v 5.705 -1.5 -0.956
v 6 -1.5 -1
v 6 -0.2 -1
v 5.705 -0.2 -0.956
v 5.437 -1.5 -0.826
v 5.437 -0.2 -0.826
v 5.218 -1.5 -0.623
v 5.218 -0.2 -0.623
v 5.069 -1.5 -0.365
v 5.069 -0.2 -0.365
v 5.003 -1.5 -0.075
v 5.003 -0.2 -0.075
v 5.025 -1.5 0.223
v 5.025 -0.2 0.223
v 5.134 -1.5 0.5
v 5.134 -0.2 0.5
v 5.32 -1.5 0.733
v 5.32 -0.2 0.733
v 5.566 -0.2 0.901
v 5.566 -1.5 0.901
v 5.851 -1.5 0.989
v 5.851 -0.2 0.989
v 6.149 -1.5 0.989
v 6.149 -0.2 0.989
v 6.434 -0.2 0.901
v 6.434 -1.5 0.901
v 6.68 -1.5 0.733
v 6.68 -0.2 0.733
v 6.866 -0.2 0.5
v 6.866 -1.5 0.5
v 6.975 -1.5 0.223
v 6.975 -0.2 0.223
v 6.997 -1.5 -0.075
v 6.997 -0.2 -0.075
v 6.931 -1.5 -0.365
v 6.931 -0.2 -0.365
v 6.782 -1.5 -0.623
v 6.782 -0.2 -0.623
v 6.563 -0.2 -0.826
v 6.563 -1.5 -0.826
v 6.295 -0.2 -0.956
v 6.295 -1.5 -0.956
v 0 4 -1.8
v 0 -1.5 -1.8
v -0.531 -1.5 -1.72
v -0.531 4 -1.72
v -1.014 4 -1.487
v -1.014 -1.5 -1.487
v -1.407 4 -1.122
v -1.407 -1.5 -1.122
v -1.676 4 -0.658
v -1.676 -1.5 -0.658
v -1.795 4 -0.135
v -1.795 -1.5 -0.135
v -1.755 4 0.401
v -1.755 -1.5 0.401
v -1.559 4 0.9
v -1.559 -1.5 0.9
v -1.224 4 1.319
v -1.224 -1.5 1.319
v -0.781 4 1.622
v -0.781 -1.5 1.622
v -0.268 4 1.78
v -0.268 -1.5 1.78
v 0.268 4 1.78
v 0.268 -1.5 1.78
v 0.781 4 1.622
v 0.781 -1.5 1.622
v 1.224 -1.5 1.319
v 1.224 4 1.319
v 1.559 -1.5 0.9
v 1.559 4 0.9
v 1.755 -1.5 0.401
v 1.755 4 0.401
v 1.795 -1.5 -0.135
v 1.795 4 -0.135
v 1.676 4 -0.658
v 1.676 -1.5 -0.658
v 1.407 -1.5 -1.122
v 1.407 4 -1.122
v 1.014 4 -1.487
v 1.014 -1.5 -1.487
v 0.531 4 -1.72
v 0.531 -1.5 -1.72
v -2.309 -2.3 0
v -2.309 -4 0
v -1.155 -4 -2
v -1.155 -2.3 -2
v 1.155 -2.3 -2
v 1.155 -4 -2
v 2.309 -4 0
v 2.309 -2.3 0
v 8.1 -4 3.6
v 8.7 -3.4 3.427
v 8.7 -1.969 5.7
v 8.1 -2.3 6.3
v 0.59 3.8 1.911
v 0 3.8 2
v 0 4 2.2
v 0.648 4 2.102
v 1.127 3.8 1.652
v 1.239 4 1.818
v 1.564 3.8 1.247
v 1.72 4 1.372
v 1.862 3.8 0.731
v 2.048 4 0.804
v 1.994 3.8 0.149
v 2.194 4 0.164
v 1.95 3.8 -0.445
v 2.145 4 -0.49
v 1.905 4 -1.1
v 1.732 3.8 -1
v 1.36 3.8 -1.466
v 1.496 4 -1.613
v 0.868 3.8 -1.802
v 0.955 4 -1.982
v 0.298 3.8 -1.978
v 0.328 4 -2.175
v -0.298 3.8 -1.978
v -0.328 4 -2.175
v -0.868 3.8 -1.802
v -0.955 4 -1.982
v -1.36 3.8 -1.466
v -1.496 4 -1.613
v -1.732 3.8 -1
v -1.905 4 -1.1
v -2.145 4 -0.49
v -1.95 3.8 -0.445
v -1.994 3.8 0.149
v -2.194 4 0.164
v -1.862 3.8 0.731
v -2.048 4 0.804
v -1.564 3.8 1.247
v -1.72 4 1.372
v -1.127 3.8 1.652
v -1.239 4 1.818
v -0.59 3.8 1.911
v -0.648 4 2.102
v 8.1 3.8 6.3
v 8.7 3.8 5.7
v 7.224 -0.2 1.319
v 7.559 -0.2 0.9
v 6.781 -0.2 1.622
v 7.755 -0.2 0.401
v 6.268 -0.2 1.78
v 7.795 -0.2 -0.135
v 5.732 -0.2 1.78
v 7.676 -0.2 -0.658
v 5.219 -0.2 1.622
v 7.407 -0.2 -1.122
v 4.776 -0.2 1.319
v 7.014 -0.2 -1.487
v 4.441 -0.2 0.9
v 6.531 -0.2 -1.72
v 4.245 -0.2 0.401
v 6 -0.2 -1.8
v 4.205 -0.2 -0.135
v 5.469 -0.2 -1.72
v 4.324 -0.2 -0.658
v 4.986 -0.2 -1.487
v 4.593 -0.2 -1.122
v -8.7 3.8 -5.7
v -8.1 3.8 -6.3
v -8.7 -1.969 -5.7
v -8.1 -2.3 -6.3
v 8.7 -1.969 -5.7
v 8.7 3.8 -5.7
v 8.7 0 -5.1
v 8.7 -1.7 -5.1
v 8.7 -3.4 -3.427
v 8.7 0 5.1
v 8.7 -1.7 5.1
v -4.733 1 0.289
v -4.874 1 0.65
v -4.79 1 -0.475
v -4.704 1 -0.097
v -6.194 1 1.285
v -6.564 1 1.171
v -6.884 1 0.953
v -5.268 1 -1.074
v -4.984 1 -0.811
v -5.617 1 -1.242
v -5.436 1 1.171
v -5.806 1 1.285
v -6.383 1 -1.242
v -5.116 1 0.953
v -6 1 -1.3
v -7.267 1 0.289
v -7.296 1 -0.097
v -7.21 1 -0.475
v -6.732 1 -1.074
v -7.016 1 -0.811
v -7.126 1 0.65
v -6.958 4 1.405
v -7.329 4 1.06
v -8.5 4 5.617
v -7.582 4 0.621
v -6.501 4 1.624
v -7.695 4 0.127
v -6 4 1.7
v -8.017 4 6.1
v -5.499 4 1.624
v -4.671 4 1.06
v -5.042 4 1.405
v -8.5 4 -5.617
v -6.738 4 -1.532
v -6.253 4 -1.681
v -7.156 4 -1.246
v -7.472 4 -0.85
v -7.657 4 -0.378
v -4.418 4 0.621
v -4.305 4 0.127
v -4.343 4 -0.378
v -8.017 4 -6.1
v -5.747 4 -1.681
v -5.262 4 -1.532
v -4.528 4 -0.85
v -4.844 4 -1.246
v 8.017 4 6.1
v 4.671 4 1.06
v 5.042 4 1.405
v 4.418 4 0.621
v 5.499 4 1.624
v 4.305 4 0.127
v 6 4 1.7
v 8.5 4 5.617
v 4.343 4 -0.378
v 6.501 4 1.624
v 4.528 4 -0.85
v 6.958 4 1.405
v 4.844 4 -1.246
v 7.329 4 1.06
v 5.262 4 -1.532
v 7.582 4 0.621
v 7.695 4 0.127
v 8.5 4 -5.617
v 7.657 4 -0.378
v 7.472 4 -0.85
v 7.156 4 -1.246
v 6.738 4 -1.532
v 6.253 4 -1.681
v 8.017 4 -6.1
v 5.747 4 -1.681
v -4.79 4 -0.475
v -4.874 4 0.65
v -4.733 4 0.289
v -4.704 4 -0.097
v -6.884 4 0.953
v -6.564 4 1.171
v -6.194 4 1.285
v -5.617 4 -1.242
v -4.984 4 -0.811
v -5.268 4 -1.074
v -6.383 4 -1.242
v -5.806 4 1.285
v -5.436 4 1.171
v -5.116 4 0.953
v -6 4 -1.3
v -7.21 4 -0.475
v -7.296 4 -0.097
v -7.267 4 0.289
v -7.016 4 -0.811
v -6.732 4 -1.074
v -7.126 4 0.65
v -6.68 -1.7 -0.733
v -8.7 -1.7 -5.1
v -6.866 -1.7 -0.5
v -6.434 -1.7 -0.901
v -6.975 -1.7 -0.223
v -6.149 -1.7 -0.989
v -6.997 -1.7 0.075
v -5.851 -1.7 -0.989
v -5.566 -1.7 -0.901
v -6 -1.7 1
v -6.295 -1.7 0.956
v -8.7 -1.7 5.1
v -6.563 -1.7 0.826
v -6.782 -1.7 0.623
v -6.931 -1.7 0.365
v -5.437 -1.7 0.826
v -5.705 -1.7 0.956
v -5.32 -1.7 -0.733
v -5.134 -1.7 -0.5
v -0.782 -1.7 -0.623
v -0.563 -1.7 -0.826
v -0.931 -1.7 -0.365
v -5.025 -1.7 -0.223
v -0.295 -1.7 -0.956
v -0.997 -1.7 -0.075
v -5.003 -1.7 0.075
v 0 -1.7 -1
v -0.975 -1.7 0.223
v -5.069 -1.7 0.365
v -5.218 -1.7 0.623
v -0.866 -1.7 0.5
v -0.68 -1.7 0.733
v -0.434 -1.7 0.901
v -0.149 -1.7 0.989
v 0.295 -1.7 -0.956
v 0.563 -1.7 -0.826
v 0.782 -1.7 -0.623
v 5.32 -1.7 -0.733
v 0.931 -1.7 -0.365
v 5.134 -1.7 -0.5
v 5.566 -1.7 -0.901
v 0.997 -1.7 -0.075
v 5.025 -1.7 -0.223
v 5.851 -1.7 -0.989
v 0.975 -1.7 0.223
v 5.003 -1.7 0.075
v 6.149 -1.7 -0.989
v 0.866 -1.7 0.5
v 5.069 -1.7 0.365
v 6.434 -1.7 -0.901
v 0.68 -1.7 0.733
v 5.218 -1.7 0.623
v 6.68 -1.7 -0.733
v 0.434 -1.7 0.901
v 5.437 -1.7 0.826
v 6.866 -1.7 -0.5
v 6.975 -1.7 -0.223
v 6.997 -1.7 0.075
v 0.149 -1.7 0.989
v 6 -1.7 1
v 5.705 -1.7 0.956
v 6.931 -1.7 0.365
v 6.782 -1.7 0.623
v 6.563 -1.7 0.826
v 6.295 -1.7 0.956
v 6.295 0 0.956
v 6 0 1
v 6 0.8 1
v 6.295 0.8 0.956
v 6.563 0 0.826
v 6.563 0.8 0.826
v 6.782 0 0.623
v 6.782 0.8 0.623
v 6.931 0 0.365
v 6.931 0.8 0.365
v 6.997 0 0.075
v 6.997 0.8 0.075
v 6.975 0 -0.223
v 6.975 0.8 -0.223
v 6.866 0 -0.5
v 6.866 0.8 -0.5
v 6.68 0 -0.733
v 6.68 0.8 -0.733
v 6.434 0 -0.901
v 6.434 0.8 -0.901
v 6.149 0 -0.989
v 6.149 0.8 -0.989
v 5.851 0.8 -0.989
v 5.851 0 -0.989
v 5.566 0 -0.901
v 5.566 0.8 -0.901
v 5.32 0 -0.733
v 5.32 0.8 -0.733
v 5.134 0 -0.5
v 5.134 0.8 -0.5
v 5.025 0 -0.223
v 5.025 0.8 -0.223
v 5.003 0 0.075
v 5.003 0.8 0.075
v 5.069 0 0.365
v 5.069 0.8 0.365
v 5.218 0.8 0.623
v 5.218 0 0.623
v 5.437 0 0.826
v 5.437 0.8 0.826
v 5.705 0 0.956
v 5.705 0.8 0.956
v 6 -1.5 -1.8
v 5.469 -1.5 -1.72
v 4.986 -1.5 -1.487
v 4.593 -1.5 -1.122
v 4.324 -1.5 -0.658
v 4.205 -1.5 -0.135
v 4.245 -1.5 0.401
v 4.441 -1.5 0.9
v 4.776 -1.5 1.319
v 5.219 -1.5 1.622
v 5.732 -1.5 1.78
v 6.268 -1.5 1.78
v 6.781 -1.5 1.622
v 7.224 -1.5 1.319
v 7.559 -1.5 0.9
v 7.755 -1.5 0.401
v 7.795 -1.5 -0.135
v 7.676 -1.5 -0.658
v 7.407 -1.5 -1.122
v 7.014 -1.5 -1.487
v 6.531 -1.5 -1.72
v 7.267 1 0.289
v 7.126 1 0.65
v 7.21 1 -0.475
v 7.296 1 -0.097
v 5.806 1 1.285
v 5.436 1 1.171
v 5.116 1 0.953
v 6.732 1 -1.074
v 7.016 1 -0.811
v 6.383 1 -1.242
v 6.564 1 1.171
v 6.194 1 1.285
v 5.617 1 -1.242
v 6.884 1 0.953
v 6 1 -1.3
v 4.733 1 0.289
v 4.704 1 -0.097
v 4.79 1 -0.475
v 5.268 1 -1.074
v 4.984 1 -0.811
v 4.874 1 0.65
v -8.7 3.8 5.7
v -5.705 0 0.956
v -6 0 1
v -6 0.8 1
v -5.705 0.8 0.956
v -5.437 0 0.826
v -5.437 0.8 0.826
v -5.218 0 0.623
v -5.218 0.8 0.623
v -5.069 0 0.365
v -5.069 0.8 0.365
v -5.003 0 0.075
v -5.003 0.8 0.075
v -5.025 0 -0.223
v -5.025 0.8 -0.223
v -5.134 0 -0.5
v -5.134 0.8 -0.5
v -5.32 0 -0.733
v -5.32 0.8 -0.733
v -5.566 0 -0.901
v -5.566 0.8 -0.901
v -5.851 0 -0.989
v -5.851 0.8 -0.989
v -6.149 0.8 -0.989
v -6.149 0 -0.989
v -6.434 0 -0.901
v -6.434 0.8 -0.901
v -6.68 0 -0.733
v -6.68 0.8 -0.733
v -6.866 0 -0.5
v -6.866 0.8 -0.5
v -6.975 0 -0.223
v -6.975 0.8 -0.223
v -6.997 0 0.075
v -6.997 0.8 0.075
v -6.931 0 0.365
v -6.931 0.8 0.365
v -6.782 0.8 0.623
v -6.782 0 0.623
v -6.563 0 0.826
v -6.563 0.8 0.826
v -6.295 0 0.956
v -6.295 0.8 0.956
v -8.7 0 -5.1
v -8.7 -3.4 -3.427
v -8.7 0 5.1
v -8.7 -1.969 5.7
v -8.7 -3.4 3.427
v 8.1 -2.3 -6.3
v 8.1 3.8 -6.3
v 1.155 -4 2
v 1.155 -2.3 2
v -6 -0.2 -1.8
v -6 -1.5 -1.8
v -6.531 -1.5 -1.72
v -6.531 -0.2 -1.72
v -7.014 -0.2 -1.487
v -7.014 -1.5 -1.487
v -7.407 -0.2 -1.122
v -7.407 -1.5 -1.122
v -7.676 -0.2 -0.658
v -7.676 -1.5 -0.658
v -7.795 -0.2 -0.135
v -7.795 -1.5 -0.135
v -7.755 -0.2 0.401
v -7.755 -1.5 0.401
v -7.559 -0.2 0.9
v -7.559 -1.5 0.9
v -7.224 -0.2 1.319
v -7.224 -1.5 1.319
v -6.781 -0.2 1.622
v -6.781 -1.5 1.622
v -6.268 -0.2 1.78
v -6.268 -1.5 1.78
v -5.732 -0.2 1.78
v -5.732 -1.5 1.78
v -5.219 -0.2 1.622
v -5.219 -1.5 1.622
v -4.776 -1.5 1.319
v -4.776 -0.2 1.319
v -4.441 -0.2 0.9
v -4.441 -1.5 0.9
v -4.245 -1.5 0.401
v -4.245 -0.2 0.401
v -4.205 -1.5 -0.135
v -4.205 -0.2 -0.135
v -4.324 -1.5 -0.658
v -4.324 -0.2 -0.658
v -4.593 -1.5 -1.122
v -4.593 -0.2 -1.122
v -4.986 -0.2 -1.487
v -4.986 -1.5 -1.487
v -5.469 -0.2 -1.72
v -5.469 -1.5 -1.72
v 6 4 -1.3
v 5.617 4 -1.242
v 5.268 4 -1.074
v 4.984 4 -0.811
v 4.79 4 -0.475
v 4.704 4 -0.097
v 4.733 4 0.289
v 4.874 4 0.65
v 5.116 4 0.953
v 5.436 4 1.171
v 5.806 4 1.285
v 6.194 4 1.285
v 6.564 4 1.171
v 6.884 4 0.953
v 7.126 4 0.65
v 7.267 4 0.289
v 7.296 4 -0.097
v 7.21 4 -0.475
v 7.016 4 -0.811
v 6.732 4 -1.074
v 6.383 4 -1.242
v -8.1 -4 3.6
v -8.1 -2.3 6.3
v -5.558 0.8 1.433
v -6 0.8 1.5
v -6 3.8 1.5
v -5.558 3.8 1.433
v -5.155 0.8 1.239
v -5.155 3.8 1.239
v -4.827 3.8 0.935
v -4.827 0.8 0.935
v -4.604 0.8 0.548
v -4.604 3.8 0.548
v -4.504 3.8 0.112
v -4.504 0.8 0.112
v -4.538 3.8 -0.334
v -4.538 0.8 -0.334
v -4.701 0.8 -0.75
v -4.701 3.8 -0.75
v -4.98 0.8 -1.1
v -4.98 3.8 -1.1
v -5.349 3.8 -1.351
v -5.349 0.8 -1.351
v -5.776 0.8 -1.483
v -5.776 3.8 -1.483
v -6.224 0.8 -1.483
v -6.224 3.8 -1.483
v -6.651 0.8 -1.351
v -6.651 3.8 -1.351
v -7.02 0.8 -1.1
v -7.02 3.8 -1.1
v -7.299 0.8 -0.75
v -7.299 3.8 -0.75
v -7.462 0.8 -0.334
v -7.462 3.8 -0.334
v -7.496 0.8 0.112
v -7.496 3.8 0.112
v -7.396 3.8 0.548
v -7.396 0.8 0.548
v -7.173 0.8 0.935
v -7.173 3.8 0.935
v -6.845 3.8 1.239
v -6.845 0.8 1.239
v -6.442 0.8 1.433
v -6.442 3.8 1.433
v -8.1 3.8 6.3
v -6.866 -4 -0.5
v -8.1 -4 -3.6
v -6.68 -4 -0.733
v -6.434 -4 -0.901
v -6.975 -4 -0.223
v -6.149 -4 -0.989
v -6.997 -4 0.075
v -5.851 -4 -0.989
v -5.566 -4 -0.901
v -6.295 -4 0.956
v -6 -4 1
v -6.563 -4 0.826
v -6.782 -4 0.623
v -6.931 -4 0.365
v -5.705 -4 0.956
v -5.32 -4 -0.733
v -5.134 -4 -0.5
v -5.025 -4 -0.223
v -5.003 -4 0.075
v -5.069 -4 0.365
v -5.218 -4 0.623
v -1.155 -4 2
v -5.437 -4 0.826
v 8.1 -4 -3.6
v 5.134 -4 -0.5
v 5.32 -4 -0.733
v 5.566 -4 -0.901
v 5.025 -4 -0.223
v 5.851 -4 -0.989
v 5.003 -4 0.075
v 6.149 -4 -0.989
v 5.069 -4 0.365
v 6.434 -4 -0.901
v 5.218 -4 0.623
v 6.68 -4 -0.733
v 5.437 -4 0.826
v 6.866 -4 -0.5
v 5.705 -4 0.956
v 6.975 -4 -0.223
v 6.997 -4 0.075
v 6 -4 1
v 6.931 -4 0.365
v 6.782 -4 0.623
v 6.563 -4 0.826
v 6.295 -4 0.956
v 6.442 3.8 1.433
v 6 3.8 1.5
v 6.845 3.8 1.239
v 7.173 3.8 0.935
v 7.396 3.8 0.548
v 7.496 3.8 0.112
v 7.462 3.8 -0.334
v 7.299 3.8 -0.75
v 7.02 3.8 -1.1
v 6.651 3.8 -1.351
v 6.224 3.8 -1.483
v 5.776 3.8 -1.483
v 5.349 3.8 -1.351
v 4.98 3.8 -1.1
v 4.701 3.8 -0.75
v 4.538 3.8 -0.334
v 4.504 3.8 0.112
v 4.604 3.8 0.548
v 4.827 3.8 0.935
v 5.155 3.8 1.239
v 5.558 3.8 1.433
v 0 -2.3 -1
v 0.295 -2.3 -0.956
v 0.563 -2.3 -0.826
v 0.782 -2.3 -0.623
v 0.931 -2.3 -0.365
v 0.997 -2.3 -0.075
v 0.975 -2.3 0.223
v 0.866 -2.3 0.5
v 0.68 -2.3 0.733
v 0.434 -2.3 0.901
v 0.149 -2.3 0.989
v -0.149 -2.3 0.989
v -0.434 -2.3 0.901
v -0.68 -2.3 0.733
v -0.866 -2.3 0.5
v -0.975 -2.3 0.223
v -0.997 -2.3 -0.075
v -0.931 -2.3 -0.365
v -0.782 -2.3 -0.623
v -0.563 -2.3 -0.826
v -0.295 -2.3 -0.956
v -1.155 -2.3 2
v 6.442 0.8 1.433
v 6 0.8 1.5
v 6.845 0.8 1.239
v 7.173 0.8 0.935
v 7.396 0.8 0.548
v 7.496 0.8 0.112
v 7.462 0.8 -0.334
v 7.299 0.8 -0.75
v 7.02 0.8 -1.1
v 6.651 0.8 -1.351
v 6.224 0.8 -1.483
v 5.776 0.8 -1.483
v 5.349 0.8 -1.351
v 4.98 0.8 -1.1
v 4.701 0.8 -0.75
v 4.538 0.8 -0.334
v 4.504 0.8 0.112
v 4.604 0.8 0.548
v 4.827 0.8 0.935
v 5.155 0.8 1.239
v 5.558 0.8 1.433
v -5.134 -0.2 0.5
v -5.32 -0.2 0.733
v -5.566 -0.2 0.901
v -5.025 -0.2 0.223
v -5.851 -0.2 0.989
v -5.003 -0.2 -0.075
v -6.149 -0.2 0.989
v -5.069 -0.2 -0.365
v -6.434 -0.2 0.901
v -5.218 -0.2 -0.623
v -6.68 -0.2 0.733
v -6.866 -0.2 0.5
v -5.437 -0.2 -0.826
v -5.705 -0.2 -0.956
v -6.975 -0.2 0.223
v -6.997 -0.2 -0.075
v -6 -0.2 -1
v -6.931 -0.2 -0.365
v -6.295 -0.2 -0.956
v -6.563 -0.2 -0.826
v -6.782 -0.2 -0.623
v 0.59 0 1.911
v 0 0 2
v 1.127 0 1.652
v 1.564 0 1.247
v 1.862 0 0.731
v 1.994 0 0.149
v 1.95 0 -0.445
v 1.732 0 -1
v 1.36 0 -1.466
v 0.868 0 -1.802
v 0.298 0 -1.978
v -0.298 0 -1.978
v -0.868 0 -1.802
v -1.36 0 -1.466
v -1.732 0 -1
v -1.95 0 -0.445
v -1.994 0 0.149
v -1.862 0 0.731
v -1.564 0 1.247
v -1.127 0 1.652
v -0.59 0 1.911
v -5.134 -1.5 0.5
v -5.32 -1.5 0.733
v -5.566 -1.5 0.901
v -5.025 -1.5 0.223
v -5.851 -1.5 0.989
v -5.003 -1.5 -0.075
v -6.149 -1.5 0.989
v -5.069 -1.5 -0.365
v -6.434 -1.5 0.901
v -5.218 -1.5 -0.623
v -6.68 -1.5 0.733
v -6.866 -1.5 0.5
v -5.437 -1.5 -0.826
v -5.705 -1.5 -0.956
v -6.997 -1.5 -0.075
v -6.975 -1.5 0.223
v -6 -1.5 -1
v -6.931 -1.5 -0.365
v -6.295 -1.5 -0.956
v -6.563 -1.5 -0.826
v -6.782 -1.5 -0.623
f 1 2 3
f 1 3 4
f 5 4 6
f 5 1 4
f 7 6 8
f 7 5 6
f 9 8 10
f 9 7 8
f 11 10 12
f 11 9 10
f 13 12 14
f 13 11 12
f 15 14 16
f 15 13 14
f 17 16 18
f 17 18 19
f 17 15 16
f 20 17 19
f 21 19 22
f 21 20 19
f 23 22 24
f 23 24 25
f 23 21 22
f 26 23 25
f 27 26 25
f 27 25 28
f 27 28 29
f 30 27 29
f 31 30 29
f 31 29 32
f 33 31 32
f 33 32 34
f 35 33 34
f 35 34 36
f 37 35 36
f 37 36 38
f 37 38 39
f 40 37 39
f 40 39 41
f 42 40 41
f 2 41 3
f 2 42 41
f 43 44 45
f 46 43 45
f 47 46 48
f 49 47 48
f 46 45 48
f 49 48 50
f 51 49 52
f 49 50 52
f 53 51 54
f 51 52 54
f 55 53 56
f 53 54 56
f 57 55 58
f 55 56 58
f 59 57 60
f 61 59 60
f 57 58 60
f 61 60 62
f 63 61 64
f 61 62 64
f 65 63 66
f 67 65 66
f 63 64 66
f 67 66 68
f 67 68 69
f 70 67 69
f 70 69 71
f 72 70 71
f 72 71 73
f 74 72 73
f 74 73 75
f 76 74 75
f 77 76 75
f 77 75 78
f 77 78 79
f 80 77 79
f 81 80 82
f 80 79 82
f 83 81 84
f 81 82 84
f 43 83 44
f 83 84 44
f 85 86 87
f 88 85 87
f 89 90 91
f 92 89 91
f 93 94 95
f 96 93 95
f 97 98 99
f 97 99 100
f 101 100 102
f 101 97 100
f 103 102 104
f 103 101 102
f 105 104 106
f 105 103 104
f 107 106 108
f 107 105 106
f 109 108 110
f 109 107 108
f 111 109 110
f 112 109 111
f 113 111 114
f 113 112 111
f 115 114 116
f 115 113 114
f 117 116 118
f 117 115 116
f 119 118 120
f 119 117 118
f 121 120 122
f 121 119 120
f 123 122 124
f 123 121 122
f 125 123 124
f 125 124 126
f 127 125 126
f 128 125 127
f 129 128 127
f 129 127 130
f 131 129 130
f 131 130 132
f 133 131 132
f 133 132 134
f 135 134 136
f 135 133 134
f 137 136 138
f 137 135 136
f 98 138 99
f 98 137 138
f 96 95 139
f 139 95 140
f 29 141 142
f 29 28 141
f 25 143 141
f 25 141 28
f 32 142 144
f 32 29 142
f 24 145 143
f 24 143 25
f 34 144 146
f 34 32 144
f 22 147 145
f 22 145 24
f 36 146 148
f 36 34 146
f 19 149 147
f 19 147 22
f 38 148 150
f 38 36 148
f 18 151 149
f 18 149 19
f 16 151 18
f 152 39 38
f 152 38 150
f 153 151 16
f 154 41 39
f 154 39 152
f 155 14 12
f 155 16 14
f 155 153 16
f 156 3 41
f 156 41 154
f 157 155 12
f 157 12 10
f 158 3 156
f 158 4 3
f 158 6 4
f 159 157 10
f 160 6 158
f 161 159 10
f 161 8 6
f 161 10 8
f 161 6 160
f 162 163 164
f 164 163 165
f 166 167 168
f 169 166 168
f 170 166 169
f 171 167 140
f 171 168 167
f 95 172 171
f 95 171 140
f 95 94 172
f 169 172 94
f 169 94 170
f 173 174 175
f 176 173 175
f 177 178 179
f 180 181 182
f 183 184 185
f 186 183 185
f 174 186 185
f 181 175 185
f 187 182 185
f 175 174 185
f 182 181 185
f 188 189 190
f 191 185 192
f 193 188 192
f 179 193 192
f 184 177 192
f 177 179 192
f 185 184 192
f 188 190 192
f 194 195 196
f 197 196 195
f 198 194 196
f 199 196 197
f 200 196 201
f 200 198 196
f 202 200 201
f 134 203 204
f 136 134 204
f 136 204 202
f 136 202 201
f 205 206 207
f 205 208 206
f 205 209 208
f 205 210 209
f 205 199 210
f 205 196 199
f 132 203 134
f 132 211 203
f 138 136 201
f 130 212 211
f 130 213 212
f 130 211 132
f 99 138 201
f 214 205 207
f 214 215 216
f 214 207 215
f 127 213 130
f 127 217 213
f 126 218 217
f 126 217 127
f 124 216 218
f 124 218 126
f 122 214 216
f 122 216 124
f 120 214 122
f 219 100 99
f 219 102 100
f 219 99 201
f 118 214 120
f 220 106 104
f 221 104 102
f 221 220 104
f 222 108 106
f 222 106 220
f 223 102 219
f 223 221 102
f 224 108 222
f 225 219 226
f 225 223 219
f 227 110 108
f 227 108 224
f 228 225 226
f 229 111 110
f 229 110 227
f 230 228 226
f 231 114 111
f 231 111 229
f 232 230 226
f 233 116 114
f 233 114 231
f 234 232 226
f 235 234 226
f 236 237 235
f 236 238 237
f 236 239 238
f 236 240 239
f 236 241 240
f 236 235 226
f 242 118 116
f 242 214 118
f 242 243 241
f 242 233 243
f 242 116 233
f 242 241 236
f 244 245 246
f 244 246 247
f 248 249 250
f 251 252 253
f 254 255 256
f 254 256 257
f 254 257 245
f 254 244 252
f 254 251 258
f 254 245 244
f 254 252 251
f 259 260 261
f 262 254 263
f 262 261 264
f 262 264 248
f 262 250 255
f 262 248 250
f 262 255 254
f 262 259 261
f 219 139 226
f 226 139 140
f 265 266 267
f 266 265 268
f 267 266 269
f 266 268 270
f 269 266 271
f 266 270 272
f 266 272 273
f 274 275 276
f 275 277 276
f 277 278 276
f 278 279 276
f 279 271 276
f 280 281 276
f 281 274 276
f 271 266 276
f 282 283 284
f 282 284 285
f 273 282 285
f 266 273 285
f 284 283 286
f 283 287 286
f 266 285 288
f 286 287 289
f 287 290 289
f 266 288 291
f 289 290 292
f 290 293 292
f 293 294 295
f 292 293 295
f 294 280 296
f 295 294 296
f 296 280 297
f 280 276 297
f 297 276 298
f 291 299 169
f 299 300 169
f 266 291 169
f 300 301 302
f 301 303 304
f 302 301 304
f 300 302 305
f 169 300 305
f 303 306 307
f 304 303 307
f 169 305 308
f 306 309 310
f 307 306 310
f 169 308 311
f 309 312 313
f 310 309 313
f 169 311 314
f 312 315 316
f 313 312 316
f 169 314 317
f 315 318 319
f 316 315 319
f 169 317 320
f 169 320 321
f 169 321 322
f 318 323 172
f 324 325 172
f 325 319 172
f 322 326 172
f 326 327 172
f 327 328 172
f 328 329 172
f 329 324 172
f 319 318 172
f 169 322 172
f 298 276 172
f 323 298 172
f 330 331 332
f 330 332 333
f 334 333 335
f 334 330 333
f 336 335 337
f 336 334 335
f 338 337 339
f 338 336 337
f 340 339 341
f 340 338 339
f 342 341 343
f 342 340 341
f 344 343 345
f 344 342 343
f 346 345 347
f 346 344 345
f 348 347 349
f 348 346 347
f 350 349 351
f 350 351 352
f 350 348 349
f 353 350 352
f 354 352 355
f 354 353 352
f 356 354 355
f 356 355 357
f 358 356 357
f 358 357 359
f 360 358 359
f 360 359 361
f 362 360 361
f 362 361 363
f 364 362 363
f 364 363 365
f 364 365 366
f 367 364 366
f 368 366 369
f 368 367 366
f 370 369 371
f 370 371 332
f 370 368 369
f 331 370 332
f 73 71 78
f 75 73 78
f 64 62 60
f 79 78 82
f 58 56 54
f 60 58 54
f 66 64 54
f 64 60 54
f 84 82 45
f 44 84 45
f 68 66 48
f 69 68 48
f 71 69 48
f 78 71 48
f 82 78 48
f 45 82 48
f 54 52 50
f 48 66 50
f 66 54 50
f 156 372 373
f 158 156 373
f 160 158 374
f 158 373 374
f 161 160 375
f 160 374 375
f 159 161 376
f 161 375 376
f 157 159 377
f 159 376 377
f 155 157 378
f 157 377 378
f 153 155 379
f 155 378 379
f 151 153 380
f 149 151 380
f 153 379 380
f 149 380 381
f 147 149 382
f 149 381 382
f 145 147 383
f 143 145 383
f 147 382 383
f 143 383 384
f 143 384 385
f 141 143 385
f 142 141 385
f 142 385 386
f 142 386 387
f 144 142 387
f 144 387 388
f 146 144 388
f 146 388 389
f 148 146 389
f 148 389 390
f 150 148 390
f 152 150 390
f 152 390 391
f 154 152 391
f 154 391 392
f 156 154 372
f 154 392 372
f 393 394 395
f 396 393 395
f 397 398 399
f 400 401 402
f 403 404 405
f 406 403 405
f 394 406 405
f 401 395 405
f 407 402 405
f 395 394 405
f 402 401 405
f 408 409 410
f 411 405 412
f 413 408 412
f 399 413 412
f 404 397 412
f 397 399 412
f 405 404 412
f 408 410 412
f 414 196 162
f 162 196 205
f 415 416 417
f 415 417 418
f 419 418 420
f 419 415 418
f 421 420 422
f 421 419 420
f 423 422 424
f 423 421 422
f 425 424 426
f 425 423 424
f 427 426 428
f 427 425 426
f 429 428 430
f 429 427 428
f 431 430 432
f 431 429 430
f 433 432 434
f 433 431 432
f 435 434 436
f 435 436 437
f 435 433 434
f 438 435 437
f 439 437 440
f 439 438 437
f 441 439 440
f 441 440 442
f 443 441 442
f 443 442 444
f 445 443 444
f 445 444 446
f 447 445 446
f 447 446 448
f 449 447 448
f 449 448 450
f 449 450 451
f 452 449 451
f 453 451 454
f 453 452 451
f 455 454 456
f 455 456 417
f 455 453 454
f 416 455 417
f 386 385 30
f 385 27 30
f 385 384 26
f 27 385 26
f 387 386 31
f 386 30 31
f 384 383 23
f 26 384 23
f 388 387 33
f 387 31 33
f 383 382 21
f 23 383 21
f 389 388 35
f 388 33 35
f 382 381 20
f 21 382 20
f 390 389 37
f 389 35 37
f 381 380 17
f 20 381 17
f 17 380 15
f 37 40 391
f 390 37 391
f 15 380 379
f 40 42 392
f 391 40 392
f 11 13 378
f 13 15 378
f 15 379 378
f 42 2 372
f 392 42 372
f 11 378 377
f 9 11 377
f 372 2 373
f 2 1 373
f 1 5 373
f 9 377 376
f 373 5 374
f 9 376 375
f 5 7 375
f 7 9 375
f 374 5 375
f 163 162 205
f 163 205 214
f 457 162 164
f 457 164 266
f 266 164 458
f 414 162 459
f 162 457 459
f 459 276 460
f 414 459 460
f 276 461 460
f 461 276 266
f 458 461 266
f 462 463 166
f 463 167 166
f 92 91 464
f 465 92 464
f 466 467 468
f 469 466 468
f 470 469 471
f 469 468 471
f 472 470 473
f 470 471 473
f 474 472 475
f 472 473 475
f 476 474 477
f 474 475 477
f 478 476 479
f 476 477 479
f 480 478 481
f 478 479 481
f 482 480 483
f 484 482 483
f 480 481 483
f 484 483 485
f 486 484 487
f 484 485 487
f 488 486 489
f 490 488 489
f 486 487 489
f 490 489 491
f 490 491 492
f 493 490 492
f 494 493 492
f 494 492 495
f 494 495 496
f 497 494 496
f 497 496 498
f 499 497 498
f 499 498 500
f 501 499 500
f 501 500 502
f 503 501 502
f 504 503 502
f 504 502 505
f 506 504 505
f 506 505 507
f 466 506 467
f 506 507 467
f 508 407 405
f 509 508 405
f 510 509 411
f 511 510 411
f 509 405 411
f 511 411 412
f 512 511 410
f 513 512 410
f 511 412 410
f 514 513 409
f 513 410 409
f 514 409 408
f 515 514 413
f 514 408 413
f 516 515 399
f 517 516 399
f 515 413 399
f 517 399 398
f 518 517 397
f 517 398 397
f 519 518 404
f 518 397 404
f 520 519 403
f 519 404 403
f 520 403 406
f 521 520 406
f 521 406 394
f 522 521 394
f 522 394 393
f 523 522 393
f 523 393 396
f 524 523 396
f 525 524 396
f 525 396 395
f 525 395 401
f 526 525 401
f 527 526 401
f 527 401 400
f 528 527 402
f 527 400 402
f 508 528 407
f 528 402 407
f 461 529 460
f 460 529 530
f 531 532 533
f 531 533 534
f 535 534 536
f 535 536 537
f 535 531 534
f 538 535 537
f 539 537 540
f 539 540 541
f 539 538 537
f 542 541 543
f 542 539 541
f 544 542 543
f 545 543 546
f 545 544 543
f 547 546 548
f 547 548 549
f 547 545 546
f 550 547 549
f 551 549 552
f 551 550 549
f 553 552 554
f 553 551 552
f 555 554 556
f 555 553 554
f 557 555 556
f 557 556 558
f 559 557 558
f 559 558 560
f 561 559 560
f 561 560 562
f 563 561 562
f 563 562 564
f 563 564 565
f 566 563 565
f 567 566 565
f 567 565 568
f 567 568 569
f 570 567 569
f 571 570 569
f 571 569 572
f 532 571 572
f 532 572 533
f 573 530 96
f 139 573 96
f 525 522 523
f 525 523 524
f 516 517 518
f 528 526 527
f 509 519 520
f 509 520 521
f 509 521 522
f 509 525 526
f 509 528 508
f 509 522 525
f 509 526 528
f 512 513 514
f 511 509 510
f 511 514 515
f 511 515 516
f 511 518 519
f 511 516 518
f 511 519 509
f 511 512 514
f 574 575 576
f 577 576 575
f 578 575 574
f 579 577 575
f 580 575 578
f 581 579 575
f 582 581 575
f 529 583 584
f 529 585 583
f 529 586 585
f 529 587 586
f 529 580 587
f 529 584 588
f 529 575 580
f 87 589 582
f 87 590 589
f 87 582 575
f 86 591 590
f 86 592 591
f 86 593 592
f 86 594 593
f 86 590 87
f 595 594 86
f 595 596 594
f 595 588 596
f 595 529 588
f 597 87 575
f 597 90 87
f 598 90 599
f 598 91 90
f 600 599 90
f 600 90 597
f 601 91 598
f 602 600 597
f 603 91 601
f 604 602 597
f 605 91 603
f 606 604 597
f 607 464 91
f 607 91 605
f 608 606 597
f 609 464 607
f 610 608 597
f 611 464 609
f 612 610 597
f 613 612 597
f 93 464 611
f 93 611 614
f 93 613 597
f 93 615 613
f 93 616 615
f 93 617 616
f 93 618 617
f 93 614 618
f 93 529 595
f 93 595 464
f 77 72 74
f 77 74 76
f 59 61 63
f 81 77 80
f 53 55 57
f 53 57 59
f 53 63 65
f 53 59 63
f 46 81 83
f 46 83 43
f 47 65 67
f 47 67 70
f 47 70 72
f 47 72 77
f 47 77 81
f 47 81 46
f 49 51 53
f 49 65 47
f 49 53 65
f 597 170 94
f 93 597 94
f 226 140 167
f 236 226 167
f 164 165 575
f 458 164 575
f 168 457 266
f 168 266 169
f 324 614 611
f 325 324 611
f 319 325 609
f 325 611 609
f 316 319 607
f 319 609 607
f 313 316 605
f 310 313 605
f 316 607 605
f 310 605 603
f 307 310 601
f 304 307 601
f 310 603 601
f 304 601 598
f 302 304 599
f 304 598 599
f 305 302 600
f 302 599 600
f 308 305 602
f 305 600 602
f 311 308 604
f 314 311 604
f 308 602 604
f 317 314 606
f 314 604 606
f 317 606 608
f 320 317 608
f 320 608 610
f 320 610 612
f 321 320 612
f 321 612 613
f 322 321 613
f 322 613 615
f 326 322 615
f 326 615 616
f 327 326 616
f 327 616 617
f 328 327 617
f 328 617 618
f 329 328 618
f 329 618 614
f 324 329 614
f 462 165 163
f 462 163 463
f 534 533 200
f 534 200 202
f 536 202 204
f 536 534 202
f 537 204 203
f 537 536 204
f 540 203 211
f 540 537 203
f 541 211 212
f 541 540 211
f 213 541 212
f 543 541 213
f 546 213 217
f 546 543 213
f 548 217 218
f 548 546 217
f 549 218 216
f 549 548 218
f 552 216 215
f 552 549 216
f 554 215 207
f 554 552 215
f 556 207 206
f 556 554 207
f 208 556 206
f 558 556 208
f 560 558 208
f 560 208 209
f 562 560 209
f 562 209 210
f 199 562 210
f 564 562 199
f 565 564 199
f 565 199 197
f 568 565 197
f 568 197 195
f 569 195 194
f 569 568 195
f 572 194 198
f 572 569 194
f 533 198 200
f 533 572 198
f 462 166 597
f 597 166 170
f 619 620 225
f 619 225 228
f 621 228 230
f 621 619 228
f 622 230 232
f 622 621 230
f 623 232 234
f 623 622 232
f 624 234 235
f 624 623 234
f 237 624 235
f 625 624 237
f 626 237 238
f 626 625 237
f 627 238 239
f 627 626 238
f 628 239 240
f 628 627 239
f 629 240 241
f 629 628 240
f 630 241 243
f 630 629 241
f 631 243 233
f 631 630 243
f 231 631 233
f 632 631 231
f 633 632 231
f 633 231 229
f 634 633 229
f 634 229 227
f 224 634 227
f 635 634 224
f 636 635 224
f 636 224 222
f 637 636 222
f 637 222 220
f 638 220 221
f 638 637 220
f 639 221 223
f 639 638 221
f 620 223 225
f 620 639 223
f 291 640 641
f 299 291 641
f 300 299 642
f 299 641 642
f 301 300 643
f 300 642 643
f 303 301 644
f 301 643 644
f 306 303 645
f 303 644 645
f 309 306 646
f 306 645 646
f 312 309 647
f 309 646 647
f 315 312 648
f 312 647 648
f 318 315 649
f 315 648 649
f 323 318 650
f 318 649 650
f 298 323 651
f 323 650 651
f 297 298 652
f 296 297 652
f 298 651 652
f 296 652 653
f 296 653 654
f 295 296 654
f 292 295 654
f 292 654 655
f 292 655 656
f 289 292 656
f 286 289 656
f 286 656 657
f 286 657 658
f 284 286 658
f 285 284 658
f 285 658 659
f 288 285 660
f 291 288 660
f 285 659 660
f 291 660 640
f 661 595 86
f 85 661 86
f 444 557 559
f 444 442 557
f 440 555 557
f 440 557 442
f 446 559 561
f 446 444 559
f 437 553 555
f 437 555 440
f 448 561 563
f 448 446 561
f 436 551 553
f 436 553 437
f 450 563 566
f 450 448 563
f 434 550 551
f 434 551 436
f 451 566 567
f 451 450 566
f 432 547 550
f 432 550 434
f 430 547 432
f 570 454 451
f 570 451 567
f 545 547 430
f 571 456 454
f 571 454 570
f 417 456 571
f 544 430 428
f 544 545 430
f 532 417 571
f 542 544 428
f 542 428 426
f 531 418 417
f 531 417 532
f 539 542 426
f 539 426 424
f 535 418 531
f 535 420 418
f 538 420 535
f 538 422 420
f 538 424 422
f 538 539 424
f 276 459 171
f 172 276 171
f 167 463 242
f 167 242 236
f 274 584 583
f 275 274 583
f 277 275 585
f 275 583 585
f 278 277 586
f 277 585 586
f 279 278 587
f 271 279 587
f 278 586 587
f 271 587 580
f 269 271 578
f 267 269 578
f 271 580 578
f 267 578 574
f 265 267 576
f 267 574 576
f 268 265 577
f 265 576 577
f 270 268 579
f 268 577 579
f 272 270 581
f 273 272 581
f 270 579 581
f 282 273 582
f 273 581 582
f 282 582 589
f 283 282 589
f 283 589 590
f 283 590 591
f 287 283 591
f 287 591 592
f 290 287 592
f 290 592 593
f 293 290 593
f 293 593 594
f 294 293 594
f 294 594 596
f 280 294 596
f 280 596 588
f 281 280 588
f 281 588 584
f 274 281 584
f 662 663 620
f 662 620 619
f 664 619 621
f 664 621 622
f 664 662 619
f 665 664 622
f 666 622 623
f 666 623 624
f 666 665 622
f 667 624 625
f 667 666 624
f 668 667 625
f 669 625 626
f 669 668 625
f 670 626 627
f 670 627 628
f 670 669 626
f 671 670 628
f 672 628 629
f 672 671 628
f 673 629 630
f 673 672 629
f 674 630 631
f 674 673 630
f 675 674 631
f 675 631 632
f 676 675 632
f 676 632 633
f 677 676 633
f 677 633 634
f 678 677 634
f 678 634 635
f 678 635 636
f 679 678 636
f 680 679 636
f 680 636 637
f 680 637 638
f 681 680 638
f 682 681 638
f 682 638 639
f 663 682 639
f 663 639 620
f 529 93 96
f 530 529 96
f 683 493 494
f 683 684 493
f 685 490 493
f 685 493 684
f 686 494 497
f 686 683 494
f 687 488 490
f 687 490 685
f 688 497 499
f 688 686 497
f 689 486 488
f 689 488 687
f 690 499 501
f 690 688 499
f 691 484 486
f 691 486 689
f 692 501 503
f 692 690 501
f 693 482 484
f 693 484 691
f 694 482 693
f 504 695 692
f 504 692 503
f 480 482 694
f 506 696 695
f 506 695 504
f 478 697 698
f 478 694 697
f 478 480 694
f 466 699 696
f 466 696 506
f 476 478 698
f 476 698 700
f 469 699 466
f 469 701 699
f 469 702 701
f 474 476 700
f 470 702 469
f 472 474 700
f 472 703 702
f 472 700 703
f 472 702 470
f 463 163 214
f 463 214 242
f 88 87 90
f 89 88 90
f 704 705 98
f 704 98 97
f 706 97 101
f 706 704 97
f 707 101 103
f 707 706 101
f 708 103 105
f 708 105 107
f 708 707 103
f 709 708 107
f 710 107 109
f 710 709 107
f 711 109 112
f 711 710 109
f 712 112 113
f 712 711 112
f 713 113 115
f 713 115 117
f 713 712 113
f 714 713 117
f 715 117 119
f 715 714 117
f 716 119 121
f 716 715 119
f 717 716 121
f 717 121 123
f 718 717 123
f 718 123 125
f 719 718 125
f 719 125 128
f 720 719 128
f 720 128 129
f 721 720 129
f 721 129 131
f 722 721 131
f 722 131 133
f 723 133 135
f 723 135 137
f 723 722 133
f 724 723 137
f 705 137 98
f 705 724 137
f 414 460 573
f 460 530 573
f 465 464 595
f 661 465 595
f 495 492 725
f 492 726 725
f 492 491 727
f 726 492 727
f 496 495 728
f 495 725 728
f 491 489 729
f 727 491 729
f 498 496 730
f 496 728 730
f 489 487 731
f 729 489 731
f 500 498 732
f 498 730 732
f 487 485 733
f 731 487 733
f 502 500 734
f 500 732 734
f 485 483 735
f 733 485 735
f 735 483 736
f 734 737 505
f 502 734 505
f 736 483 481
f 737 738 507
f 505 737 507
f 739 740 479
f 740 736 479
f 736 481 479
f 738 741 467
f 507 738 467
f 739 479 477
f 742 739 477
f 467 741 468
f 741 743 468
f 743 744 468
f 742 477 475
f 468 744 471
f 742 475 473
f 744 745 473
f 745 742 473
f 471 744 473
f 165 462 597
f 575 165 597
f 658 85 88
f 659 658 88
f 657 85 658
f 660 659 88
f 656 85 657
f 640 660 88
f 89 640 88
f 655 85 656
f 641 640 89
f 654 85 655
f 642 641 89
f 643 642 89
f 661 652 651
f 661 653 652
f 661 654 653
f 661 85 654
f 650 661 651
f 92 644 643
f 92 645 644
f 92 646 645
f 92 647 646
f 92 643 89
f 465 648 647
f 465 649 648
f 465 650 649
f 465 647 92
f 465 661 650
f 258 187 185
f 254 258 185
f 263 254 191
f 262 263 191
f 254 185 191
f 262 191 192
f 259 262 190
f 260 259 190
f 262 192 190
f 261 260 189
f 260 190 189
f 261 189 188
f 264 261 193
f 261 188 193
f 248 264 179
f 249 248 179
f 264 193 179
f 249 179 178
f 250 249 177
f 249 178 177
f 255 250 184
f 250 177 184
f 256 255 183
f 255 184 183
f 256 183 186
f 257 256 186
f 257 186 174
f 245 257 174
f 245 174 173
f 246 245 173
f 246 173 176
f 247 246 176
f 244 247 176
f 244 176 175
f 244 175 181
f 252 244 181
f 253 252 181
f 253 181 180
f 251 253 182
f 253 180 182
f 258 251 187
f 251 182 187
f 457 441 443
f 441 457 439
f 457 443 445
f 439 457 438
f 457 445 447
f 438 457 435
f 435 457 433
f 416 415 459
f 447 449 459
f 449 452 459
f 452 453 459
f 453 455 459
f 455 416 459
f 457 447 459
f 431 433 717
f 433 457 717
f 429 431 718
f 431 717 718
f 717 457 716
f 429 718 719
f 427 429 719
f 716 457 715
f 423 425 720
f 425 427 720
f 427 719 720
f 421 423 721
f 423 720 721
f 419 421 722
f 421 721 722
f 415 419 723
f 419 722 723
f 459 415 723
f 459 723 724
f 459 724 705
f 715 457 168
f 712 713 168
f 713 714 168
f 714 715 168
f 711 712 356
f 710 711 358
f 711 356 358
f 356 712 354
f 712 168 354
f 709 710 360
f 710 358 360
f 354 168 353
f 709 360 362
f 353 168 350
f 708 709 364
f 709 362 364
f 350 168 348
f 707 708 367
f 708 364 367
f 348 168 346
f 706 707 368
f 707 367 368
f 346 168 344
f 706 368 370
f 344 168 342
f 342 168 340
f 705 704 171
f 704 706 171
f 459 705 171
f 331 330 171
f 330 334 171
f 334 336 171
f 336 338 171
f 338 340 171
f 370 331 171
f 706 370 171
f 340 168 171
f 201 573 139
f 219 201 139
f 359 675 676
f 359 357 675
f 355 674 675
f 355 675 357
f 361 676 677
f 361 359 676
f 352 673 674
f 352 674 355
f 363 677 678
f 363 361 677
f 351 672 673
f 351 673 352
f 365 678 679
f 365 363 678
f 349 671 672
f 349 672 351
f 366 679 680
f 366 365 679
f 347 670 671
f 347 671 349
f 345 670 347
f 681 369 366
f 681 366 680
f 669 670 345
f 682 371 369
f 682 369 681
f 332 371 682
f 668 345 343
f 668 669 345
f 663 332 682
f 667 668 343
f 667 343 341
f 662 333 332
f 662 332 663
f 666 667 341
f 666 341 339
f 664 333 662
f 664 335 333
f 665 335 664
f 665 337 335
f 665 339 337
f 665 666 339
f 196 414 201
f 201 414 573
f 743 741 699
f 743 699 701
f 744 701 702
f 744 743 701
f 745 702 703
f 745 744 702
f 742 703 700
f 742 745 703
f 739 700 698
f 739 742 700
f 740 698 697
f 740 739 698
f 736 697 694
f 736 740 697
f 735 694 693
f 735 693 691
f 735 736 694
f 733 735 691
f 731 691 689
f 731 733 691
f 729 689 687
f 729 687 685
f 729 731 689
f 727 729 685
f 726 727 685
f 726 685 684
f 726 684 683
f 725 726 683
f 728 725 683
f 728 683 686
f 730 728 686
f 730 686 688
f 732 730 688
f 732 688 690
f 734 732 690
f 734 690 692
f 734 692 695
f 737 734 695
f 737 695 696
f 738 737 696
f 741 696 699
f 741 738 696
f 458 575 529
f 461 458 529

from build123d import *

# Parameters (mm, degrees)
SKETCH3_W               = 17.4000014
SKETCH3_H               = 12.59999981
SKETCH3_R               = 1.5
SKETCH3_R_2             = 2
BOSS_EXTRUDE1_DEPTH     = 4
BOSS_EXTRUDE2_START     = -4
SKETCH4_R               = 1.5
SKETCH4_R_2             = 1
BOSS_EXTRUDE2_DEPTH     = 0.8
BOSS_EXTRUDE7_START     = 0.2
SKETCH11_R              = 1.3
BOSS_EXTRUDE7_DEPTH     = 3
BOSS_EXTRUDE7_2_DEPTH   = 3
SKETCH5_W               = 17.4000014
SKETCH5_H               = 1.2
BOSS_EXTRUDE3_DEPTH     = 1.7
BOSS_EXTRUDE5_START     = 0.6
SKETCH8_W               = 17.4000014
SKETCH8_H               = 12.59999981
SKETCH8_R               = 1.00000054
BOSS_EXTRUDE5_DEPTH     = 0.6
BOSS_EXTRUDE8_START     = 1.7
SKETCH12_W              = 17.4000014
SKETCH12_H              = 12.59999981
SKETCH12_R              = 1.00000054
BOSS_EXTRUDE8_DEPTH     = 1.7
CUT_EXTRUDE1_DEPTH      = 19.932777068
CUT_EXTRUDE1_DEPTH_BACK = 19.932777068
CHAMFER1_SIZE           = 0.6
CHAMFER3_SIZE           = 0.2
BOSS_EXTRUDE9_START     = 0.2
SKETCH14_R              = 1.8
BOSS_EXTRUDE9_DEPTH     = 5.5
BOSS_EXTRUDE10_START    = 0.2
SKETCH15_R              = 1.80000054
SKETCH15_R_2            = 1.00000054
BOSS_EXTRUDE10_DEPTH    = 1.3
BOSS_EXTRUDE10_2_DEPTH  = 1.3


with BuildPart() as part:
    # Sketch3 → Boss-Extrude1 (new body)
    with BuildSketch(Plane(origin=(0, 0, 0), x_dir=(1, 0, 0), z_dir=(0, 1, 0))):
        Rectangle(SKETCH3_W, SKETCH3_H)
        with Locations(Location((-6.0000007, 0, 0), (0, 0, 270))):
            Circle(SKETCH3_R, mode=Mode.SUBTRACT)
        with Locations(Location((0, 0, 0), (0, 0, 270))):
            Circle(SKETCH3_R_2, mode=Mode.SUBTRACT)
        with Locations(Location((6.0000007, 0, 0), (0, 0, 270))):
            Circle(SKETCH3_R, mode=Mode.SUBTRACT)
    extrude(amount=BOSS_EXTRUDE1_DEPTH)

    # Sketch4 → Boss-Extrude2 (add)
    # profile 1 of 2: a face of its own
    with BuildSketch(Plane(origin=(0, 4, 0), x_dir=(1, 0, 0), z_dir=(0, 1, 0)).offset(BOSS_EXTRUDE2_START)):
        with Locations(Location((6.0000007, 0, 0), (0, 0, 270))):
            Circle(SKETCH4_R)
        with Locations(Location((6.0000007, 0, 0), (0, 0, 270))):
            Circle(SKETCH4_R_2, mode=Mode.SUBTRACT)
    # profile 2 of 2: a face of its own
    with BuildSketch(Plane(origin=(0, 4, 0), x_dir=(1, 0, 0), z_dir=(0, 1, 0)).offset(BOSS_EXTRUDE2_START)):
        with Locations(Location((-6.0000007, 0, 0), (0, 0, 270))):
            Circle(SKETCH4_R)
        with Locations(Location((-6.0000007, 0, 0), (0, 0, 270))):
            Circle(SKETCH4_R_2, mode=Mode.SUBTRACT)
    extrude(amount=BOSS_EXTRUDE2_DEPTH)

    # Sketch5 → Boss-Extrude3 (add)
    with BuildSketch(Plane.XZ):
        with Locations((0, 5.699999905)):
            Rectangle(SKETCH5_W, SKETCH5_H)
        with Locations((0, -5.699999905)):
            Rectangle(SKETCH5_W, SKETCH5_H)
    extrude(amount=BOSS_EXTRUDE3_DEPTH)

    # Sketch8 → Boss-Extrude5 (add)
    with BuildSketch(Plane.XZ.offset(1.7).offset(BOSS_EXTRUDE5_START)):
        Rectangle(SKETCH8_W, SKETCH8_H)
        with Locations(Location((6.0000007, 0, 0), (0, 0, 90))):
            Circle(SKETCH8_R, mode=Mode.SUBTRACT)
        with Locations(Location((-6.0000007, 0, 0), (0, 0, 90))):
            Circle(SKETCH8_R, mode=Mode.SUBTRACT)
        with Locations(Location((0, 0, 0), (0, 0, 270))):
            Circle(SKETCH8_R, mode=Mode.SUBTRACT)
    extrude(amount=-BOSS_EXTRUDE5_DEPTH)

    # Sketch12 → Boss-Extrude8 (add)
    with BuildSketch(Plane.XZ.offset(2.3).offset(BOSS_EXTRUDE8_START)):
        Rectangle(SKETCH12_W, SKETCH12_H)
        with Locations(Location((6.0000007, 0, 0), (0, 0, 90))):
            Circle(SKETCH12_R, mode=Mode.SUBTRACT)
        with Locations(Location((-6.0000007, 0, 0), (0, 0, 90))):
            Circle(SKETCH12_R, mode=Mode.SUBTRACT)
        Polygon((-1.154700538, 2), (-2.309401077, 0), (-1.154700538, -2), (1.154700538, -2), (2.309401077, 0), (1.154700538, 2), align=None, mode=Mode.SUBTRACT)
    extrude(amount=-BOSS_EXTRUDE8_DEPTH)

    # Sketch13 → Cut-Extrude1 (cut, two sides: drawn at the far end of the back side and taken through both)
    with BuildSketch(Plane.ZY.offset(8.7000007).offset(-CUT_EXTRUDE1_DEPTH_BACK)):
        Polygon((6.299999905, -4), (3.6, -4), (6.299999905, -2.3), align=None)
        Polygon((-6.299999905, -4), (-6.299999905, -2.3), (-3.6, -4), align=None)
    extrude(amount=CUT_EXTRUDE1_DEPTH + CUT_EXTRUDE1_DEPTH_BACK, mode=Mode.SUBTRACT)

    # Chamfer1
    chamfer1_edges = [part.edges().sort_by_distance(p)[0] for p in [
        (-8.7000007, -4, 0),
        (8.7000007, -4, 0),
        (-8.7000007, -3.15, 4.949999952),
        (8.7000007, -3.15, 4.949999952),
        (-8.7000007, -3.15, -4.949999952),
        (8.7000007, -3.15, -4.949999952),
        (8.7000007, 0.85, -6.299999905),
        (8.7000007, 0.85, 6.299999905),
        (-8.7000007, 0.85, 6.299999905),
        (-8.7000007, 0.85, -6.299999905),
    ]]
    chamfer(chamfer1_edges, length=CHAMFER1_SIZE)

    # Chamfer3
    chamfer3_edges = [part.edges().sort_by_distance(p)[0] for p in [
        (-6.0000007, 4, -1.5),
        (8.7000007, 4, 0),
        (0, 4, 6.299999905),
        (0, 4, -6.299999905),
        (-8.7000007, 4, 0),
        (-8.4000007, 4, -5.999999905),
        (-8.4000007, 4, 5.999999905),
        (8.4000007, 4, -5.999999905),
        (8.4000007, 4, 5.999999905),
        (0, 4, -2),
        (6.0000007, 4, -1.5),
    ]]
    chamfer(chamfer3_edges, length=CHAMFER3_SIZE)


with BuildPart() as body_2:
    # Sketch11 → Boss-Extrude7 (new body)
    with BuildSketch(Plane(origin=(0, 0.8, 0), x_dir=(1, 0, 0), z_dir=(0, 1, 0)).offset(BOSS_EXTRUDE7_START)):
        with Locations(Location((-6.0000007, 0, 0), (0, 0, 90))):
            Circle(SKETCH11_R)
    extrude(amount=BOSS_EXTRUDE7_DEPTH)


with BuildPart() as body_3:
    # Sketch11 → Boss-Extrude7 2 (new body)
    with BuildSketch(Plane(origin=(0, 0.8, 0), x_dir=(1, 0, 0), z_dir=(0, 1, 0)).offset(BOSS_EXTRUDE7_START)):
        with Locations(Location((6.0000007, 0, 0), (0, 0, 90))):
            Circle(SKETCH11_R)
    extrude(amount=BOSS_EXTRUDE7_2_DEPTH)


with BuildPart() as body_4:
    # Sketch14 → Boss-Extrude9 (new body)
    with BuildSketch(Plane(origin=(0, -1.7, 0), x_dir=(1, 0, 0), z_dir=(0, 1, 0)).offset(BOSS_EXTRUDE9_START)):
        with Locations(Location((0, 0, 0), (0, 0, 90))):
            Circle(SKETCH14_R)
    extrude(amount=BOSS_EXTRUDE9_DEPTH)


with BuildPart() as body_5:
    # Sketch15 → Boss-Extrude10 (new body)
    with BuildSketch(Plane(origin=(0, -1.7, 0), x_dir=(1, 0, 0), z_dir=(0, 1, 0)).offset(BOSS_EXTRUDE10_START)):
        with Locations(Location((-6.0000007, 0, 0), (0, 0, 90))):
            Circle(SKETCH15_R)
        with Locations(Location((-6.0000007, 0, 0), (0, 0, 90))):
            Circle(SKETCH15_R_2, mode=Mode.SUBTRACT)
    extrude(amount=BOSS_EXTRUDE10_DEPTH)


with BuildPart() as body_6:
    # Sketch15 → Boss-Extrude10 2 (new body)
    with BuildSketch(Plane(origin=(0, -1.7, 0), x_dir=(1, 0, 0), z_dir=(0, 1, 0)).offset(BOSS_EXTRUDE10_START)):
        with Locations(Location((6.0000007, 0, 0), (0, 0, 90))):
            Circle(SKETCH15_R)
        with Locations(Location((6.0000007, 0, 0), (0, 0, 90))):
            Circle(SKETCH15_R_2, mode=Mode.SUBTRACT)
    extrude(amount=BOSS_EXTRUDE10_2_DEPTH)


solid = Compound([part.part, body_2.part, body_3.part, body_4.part, body_5.part, body_6.part])
